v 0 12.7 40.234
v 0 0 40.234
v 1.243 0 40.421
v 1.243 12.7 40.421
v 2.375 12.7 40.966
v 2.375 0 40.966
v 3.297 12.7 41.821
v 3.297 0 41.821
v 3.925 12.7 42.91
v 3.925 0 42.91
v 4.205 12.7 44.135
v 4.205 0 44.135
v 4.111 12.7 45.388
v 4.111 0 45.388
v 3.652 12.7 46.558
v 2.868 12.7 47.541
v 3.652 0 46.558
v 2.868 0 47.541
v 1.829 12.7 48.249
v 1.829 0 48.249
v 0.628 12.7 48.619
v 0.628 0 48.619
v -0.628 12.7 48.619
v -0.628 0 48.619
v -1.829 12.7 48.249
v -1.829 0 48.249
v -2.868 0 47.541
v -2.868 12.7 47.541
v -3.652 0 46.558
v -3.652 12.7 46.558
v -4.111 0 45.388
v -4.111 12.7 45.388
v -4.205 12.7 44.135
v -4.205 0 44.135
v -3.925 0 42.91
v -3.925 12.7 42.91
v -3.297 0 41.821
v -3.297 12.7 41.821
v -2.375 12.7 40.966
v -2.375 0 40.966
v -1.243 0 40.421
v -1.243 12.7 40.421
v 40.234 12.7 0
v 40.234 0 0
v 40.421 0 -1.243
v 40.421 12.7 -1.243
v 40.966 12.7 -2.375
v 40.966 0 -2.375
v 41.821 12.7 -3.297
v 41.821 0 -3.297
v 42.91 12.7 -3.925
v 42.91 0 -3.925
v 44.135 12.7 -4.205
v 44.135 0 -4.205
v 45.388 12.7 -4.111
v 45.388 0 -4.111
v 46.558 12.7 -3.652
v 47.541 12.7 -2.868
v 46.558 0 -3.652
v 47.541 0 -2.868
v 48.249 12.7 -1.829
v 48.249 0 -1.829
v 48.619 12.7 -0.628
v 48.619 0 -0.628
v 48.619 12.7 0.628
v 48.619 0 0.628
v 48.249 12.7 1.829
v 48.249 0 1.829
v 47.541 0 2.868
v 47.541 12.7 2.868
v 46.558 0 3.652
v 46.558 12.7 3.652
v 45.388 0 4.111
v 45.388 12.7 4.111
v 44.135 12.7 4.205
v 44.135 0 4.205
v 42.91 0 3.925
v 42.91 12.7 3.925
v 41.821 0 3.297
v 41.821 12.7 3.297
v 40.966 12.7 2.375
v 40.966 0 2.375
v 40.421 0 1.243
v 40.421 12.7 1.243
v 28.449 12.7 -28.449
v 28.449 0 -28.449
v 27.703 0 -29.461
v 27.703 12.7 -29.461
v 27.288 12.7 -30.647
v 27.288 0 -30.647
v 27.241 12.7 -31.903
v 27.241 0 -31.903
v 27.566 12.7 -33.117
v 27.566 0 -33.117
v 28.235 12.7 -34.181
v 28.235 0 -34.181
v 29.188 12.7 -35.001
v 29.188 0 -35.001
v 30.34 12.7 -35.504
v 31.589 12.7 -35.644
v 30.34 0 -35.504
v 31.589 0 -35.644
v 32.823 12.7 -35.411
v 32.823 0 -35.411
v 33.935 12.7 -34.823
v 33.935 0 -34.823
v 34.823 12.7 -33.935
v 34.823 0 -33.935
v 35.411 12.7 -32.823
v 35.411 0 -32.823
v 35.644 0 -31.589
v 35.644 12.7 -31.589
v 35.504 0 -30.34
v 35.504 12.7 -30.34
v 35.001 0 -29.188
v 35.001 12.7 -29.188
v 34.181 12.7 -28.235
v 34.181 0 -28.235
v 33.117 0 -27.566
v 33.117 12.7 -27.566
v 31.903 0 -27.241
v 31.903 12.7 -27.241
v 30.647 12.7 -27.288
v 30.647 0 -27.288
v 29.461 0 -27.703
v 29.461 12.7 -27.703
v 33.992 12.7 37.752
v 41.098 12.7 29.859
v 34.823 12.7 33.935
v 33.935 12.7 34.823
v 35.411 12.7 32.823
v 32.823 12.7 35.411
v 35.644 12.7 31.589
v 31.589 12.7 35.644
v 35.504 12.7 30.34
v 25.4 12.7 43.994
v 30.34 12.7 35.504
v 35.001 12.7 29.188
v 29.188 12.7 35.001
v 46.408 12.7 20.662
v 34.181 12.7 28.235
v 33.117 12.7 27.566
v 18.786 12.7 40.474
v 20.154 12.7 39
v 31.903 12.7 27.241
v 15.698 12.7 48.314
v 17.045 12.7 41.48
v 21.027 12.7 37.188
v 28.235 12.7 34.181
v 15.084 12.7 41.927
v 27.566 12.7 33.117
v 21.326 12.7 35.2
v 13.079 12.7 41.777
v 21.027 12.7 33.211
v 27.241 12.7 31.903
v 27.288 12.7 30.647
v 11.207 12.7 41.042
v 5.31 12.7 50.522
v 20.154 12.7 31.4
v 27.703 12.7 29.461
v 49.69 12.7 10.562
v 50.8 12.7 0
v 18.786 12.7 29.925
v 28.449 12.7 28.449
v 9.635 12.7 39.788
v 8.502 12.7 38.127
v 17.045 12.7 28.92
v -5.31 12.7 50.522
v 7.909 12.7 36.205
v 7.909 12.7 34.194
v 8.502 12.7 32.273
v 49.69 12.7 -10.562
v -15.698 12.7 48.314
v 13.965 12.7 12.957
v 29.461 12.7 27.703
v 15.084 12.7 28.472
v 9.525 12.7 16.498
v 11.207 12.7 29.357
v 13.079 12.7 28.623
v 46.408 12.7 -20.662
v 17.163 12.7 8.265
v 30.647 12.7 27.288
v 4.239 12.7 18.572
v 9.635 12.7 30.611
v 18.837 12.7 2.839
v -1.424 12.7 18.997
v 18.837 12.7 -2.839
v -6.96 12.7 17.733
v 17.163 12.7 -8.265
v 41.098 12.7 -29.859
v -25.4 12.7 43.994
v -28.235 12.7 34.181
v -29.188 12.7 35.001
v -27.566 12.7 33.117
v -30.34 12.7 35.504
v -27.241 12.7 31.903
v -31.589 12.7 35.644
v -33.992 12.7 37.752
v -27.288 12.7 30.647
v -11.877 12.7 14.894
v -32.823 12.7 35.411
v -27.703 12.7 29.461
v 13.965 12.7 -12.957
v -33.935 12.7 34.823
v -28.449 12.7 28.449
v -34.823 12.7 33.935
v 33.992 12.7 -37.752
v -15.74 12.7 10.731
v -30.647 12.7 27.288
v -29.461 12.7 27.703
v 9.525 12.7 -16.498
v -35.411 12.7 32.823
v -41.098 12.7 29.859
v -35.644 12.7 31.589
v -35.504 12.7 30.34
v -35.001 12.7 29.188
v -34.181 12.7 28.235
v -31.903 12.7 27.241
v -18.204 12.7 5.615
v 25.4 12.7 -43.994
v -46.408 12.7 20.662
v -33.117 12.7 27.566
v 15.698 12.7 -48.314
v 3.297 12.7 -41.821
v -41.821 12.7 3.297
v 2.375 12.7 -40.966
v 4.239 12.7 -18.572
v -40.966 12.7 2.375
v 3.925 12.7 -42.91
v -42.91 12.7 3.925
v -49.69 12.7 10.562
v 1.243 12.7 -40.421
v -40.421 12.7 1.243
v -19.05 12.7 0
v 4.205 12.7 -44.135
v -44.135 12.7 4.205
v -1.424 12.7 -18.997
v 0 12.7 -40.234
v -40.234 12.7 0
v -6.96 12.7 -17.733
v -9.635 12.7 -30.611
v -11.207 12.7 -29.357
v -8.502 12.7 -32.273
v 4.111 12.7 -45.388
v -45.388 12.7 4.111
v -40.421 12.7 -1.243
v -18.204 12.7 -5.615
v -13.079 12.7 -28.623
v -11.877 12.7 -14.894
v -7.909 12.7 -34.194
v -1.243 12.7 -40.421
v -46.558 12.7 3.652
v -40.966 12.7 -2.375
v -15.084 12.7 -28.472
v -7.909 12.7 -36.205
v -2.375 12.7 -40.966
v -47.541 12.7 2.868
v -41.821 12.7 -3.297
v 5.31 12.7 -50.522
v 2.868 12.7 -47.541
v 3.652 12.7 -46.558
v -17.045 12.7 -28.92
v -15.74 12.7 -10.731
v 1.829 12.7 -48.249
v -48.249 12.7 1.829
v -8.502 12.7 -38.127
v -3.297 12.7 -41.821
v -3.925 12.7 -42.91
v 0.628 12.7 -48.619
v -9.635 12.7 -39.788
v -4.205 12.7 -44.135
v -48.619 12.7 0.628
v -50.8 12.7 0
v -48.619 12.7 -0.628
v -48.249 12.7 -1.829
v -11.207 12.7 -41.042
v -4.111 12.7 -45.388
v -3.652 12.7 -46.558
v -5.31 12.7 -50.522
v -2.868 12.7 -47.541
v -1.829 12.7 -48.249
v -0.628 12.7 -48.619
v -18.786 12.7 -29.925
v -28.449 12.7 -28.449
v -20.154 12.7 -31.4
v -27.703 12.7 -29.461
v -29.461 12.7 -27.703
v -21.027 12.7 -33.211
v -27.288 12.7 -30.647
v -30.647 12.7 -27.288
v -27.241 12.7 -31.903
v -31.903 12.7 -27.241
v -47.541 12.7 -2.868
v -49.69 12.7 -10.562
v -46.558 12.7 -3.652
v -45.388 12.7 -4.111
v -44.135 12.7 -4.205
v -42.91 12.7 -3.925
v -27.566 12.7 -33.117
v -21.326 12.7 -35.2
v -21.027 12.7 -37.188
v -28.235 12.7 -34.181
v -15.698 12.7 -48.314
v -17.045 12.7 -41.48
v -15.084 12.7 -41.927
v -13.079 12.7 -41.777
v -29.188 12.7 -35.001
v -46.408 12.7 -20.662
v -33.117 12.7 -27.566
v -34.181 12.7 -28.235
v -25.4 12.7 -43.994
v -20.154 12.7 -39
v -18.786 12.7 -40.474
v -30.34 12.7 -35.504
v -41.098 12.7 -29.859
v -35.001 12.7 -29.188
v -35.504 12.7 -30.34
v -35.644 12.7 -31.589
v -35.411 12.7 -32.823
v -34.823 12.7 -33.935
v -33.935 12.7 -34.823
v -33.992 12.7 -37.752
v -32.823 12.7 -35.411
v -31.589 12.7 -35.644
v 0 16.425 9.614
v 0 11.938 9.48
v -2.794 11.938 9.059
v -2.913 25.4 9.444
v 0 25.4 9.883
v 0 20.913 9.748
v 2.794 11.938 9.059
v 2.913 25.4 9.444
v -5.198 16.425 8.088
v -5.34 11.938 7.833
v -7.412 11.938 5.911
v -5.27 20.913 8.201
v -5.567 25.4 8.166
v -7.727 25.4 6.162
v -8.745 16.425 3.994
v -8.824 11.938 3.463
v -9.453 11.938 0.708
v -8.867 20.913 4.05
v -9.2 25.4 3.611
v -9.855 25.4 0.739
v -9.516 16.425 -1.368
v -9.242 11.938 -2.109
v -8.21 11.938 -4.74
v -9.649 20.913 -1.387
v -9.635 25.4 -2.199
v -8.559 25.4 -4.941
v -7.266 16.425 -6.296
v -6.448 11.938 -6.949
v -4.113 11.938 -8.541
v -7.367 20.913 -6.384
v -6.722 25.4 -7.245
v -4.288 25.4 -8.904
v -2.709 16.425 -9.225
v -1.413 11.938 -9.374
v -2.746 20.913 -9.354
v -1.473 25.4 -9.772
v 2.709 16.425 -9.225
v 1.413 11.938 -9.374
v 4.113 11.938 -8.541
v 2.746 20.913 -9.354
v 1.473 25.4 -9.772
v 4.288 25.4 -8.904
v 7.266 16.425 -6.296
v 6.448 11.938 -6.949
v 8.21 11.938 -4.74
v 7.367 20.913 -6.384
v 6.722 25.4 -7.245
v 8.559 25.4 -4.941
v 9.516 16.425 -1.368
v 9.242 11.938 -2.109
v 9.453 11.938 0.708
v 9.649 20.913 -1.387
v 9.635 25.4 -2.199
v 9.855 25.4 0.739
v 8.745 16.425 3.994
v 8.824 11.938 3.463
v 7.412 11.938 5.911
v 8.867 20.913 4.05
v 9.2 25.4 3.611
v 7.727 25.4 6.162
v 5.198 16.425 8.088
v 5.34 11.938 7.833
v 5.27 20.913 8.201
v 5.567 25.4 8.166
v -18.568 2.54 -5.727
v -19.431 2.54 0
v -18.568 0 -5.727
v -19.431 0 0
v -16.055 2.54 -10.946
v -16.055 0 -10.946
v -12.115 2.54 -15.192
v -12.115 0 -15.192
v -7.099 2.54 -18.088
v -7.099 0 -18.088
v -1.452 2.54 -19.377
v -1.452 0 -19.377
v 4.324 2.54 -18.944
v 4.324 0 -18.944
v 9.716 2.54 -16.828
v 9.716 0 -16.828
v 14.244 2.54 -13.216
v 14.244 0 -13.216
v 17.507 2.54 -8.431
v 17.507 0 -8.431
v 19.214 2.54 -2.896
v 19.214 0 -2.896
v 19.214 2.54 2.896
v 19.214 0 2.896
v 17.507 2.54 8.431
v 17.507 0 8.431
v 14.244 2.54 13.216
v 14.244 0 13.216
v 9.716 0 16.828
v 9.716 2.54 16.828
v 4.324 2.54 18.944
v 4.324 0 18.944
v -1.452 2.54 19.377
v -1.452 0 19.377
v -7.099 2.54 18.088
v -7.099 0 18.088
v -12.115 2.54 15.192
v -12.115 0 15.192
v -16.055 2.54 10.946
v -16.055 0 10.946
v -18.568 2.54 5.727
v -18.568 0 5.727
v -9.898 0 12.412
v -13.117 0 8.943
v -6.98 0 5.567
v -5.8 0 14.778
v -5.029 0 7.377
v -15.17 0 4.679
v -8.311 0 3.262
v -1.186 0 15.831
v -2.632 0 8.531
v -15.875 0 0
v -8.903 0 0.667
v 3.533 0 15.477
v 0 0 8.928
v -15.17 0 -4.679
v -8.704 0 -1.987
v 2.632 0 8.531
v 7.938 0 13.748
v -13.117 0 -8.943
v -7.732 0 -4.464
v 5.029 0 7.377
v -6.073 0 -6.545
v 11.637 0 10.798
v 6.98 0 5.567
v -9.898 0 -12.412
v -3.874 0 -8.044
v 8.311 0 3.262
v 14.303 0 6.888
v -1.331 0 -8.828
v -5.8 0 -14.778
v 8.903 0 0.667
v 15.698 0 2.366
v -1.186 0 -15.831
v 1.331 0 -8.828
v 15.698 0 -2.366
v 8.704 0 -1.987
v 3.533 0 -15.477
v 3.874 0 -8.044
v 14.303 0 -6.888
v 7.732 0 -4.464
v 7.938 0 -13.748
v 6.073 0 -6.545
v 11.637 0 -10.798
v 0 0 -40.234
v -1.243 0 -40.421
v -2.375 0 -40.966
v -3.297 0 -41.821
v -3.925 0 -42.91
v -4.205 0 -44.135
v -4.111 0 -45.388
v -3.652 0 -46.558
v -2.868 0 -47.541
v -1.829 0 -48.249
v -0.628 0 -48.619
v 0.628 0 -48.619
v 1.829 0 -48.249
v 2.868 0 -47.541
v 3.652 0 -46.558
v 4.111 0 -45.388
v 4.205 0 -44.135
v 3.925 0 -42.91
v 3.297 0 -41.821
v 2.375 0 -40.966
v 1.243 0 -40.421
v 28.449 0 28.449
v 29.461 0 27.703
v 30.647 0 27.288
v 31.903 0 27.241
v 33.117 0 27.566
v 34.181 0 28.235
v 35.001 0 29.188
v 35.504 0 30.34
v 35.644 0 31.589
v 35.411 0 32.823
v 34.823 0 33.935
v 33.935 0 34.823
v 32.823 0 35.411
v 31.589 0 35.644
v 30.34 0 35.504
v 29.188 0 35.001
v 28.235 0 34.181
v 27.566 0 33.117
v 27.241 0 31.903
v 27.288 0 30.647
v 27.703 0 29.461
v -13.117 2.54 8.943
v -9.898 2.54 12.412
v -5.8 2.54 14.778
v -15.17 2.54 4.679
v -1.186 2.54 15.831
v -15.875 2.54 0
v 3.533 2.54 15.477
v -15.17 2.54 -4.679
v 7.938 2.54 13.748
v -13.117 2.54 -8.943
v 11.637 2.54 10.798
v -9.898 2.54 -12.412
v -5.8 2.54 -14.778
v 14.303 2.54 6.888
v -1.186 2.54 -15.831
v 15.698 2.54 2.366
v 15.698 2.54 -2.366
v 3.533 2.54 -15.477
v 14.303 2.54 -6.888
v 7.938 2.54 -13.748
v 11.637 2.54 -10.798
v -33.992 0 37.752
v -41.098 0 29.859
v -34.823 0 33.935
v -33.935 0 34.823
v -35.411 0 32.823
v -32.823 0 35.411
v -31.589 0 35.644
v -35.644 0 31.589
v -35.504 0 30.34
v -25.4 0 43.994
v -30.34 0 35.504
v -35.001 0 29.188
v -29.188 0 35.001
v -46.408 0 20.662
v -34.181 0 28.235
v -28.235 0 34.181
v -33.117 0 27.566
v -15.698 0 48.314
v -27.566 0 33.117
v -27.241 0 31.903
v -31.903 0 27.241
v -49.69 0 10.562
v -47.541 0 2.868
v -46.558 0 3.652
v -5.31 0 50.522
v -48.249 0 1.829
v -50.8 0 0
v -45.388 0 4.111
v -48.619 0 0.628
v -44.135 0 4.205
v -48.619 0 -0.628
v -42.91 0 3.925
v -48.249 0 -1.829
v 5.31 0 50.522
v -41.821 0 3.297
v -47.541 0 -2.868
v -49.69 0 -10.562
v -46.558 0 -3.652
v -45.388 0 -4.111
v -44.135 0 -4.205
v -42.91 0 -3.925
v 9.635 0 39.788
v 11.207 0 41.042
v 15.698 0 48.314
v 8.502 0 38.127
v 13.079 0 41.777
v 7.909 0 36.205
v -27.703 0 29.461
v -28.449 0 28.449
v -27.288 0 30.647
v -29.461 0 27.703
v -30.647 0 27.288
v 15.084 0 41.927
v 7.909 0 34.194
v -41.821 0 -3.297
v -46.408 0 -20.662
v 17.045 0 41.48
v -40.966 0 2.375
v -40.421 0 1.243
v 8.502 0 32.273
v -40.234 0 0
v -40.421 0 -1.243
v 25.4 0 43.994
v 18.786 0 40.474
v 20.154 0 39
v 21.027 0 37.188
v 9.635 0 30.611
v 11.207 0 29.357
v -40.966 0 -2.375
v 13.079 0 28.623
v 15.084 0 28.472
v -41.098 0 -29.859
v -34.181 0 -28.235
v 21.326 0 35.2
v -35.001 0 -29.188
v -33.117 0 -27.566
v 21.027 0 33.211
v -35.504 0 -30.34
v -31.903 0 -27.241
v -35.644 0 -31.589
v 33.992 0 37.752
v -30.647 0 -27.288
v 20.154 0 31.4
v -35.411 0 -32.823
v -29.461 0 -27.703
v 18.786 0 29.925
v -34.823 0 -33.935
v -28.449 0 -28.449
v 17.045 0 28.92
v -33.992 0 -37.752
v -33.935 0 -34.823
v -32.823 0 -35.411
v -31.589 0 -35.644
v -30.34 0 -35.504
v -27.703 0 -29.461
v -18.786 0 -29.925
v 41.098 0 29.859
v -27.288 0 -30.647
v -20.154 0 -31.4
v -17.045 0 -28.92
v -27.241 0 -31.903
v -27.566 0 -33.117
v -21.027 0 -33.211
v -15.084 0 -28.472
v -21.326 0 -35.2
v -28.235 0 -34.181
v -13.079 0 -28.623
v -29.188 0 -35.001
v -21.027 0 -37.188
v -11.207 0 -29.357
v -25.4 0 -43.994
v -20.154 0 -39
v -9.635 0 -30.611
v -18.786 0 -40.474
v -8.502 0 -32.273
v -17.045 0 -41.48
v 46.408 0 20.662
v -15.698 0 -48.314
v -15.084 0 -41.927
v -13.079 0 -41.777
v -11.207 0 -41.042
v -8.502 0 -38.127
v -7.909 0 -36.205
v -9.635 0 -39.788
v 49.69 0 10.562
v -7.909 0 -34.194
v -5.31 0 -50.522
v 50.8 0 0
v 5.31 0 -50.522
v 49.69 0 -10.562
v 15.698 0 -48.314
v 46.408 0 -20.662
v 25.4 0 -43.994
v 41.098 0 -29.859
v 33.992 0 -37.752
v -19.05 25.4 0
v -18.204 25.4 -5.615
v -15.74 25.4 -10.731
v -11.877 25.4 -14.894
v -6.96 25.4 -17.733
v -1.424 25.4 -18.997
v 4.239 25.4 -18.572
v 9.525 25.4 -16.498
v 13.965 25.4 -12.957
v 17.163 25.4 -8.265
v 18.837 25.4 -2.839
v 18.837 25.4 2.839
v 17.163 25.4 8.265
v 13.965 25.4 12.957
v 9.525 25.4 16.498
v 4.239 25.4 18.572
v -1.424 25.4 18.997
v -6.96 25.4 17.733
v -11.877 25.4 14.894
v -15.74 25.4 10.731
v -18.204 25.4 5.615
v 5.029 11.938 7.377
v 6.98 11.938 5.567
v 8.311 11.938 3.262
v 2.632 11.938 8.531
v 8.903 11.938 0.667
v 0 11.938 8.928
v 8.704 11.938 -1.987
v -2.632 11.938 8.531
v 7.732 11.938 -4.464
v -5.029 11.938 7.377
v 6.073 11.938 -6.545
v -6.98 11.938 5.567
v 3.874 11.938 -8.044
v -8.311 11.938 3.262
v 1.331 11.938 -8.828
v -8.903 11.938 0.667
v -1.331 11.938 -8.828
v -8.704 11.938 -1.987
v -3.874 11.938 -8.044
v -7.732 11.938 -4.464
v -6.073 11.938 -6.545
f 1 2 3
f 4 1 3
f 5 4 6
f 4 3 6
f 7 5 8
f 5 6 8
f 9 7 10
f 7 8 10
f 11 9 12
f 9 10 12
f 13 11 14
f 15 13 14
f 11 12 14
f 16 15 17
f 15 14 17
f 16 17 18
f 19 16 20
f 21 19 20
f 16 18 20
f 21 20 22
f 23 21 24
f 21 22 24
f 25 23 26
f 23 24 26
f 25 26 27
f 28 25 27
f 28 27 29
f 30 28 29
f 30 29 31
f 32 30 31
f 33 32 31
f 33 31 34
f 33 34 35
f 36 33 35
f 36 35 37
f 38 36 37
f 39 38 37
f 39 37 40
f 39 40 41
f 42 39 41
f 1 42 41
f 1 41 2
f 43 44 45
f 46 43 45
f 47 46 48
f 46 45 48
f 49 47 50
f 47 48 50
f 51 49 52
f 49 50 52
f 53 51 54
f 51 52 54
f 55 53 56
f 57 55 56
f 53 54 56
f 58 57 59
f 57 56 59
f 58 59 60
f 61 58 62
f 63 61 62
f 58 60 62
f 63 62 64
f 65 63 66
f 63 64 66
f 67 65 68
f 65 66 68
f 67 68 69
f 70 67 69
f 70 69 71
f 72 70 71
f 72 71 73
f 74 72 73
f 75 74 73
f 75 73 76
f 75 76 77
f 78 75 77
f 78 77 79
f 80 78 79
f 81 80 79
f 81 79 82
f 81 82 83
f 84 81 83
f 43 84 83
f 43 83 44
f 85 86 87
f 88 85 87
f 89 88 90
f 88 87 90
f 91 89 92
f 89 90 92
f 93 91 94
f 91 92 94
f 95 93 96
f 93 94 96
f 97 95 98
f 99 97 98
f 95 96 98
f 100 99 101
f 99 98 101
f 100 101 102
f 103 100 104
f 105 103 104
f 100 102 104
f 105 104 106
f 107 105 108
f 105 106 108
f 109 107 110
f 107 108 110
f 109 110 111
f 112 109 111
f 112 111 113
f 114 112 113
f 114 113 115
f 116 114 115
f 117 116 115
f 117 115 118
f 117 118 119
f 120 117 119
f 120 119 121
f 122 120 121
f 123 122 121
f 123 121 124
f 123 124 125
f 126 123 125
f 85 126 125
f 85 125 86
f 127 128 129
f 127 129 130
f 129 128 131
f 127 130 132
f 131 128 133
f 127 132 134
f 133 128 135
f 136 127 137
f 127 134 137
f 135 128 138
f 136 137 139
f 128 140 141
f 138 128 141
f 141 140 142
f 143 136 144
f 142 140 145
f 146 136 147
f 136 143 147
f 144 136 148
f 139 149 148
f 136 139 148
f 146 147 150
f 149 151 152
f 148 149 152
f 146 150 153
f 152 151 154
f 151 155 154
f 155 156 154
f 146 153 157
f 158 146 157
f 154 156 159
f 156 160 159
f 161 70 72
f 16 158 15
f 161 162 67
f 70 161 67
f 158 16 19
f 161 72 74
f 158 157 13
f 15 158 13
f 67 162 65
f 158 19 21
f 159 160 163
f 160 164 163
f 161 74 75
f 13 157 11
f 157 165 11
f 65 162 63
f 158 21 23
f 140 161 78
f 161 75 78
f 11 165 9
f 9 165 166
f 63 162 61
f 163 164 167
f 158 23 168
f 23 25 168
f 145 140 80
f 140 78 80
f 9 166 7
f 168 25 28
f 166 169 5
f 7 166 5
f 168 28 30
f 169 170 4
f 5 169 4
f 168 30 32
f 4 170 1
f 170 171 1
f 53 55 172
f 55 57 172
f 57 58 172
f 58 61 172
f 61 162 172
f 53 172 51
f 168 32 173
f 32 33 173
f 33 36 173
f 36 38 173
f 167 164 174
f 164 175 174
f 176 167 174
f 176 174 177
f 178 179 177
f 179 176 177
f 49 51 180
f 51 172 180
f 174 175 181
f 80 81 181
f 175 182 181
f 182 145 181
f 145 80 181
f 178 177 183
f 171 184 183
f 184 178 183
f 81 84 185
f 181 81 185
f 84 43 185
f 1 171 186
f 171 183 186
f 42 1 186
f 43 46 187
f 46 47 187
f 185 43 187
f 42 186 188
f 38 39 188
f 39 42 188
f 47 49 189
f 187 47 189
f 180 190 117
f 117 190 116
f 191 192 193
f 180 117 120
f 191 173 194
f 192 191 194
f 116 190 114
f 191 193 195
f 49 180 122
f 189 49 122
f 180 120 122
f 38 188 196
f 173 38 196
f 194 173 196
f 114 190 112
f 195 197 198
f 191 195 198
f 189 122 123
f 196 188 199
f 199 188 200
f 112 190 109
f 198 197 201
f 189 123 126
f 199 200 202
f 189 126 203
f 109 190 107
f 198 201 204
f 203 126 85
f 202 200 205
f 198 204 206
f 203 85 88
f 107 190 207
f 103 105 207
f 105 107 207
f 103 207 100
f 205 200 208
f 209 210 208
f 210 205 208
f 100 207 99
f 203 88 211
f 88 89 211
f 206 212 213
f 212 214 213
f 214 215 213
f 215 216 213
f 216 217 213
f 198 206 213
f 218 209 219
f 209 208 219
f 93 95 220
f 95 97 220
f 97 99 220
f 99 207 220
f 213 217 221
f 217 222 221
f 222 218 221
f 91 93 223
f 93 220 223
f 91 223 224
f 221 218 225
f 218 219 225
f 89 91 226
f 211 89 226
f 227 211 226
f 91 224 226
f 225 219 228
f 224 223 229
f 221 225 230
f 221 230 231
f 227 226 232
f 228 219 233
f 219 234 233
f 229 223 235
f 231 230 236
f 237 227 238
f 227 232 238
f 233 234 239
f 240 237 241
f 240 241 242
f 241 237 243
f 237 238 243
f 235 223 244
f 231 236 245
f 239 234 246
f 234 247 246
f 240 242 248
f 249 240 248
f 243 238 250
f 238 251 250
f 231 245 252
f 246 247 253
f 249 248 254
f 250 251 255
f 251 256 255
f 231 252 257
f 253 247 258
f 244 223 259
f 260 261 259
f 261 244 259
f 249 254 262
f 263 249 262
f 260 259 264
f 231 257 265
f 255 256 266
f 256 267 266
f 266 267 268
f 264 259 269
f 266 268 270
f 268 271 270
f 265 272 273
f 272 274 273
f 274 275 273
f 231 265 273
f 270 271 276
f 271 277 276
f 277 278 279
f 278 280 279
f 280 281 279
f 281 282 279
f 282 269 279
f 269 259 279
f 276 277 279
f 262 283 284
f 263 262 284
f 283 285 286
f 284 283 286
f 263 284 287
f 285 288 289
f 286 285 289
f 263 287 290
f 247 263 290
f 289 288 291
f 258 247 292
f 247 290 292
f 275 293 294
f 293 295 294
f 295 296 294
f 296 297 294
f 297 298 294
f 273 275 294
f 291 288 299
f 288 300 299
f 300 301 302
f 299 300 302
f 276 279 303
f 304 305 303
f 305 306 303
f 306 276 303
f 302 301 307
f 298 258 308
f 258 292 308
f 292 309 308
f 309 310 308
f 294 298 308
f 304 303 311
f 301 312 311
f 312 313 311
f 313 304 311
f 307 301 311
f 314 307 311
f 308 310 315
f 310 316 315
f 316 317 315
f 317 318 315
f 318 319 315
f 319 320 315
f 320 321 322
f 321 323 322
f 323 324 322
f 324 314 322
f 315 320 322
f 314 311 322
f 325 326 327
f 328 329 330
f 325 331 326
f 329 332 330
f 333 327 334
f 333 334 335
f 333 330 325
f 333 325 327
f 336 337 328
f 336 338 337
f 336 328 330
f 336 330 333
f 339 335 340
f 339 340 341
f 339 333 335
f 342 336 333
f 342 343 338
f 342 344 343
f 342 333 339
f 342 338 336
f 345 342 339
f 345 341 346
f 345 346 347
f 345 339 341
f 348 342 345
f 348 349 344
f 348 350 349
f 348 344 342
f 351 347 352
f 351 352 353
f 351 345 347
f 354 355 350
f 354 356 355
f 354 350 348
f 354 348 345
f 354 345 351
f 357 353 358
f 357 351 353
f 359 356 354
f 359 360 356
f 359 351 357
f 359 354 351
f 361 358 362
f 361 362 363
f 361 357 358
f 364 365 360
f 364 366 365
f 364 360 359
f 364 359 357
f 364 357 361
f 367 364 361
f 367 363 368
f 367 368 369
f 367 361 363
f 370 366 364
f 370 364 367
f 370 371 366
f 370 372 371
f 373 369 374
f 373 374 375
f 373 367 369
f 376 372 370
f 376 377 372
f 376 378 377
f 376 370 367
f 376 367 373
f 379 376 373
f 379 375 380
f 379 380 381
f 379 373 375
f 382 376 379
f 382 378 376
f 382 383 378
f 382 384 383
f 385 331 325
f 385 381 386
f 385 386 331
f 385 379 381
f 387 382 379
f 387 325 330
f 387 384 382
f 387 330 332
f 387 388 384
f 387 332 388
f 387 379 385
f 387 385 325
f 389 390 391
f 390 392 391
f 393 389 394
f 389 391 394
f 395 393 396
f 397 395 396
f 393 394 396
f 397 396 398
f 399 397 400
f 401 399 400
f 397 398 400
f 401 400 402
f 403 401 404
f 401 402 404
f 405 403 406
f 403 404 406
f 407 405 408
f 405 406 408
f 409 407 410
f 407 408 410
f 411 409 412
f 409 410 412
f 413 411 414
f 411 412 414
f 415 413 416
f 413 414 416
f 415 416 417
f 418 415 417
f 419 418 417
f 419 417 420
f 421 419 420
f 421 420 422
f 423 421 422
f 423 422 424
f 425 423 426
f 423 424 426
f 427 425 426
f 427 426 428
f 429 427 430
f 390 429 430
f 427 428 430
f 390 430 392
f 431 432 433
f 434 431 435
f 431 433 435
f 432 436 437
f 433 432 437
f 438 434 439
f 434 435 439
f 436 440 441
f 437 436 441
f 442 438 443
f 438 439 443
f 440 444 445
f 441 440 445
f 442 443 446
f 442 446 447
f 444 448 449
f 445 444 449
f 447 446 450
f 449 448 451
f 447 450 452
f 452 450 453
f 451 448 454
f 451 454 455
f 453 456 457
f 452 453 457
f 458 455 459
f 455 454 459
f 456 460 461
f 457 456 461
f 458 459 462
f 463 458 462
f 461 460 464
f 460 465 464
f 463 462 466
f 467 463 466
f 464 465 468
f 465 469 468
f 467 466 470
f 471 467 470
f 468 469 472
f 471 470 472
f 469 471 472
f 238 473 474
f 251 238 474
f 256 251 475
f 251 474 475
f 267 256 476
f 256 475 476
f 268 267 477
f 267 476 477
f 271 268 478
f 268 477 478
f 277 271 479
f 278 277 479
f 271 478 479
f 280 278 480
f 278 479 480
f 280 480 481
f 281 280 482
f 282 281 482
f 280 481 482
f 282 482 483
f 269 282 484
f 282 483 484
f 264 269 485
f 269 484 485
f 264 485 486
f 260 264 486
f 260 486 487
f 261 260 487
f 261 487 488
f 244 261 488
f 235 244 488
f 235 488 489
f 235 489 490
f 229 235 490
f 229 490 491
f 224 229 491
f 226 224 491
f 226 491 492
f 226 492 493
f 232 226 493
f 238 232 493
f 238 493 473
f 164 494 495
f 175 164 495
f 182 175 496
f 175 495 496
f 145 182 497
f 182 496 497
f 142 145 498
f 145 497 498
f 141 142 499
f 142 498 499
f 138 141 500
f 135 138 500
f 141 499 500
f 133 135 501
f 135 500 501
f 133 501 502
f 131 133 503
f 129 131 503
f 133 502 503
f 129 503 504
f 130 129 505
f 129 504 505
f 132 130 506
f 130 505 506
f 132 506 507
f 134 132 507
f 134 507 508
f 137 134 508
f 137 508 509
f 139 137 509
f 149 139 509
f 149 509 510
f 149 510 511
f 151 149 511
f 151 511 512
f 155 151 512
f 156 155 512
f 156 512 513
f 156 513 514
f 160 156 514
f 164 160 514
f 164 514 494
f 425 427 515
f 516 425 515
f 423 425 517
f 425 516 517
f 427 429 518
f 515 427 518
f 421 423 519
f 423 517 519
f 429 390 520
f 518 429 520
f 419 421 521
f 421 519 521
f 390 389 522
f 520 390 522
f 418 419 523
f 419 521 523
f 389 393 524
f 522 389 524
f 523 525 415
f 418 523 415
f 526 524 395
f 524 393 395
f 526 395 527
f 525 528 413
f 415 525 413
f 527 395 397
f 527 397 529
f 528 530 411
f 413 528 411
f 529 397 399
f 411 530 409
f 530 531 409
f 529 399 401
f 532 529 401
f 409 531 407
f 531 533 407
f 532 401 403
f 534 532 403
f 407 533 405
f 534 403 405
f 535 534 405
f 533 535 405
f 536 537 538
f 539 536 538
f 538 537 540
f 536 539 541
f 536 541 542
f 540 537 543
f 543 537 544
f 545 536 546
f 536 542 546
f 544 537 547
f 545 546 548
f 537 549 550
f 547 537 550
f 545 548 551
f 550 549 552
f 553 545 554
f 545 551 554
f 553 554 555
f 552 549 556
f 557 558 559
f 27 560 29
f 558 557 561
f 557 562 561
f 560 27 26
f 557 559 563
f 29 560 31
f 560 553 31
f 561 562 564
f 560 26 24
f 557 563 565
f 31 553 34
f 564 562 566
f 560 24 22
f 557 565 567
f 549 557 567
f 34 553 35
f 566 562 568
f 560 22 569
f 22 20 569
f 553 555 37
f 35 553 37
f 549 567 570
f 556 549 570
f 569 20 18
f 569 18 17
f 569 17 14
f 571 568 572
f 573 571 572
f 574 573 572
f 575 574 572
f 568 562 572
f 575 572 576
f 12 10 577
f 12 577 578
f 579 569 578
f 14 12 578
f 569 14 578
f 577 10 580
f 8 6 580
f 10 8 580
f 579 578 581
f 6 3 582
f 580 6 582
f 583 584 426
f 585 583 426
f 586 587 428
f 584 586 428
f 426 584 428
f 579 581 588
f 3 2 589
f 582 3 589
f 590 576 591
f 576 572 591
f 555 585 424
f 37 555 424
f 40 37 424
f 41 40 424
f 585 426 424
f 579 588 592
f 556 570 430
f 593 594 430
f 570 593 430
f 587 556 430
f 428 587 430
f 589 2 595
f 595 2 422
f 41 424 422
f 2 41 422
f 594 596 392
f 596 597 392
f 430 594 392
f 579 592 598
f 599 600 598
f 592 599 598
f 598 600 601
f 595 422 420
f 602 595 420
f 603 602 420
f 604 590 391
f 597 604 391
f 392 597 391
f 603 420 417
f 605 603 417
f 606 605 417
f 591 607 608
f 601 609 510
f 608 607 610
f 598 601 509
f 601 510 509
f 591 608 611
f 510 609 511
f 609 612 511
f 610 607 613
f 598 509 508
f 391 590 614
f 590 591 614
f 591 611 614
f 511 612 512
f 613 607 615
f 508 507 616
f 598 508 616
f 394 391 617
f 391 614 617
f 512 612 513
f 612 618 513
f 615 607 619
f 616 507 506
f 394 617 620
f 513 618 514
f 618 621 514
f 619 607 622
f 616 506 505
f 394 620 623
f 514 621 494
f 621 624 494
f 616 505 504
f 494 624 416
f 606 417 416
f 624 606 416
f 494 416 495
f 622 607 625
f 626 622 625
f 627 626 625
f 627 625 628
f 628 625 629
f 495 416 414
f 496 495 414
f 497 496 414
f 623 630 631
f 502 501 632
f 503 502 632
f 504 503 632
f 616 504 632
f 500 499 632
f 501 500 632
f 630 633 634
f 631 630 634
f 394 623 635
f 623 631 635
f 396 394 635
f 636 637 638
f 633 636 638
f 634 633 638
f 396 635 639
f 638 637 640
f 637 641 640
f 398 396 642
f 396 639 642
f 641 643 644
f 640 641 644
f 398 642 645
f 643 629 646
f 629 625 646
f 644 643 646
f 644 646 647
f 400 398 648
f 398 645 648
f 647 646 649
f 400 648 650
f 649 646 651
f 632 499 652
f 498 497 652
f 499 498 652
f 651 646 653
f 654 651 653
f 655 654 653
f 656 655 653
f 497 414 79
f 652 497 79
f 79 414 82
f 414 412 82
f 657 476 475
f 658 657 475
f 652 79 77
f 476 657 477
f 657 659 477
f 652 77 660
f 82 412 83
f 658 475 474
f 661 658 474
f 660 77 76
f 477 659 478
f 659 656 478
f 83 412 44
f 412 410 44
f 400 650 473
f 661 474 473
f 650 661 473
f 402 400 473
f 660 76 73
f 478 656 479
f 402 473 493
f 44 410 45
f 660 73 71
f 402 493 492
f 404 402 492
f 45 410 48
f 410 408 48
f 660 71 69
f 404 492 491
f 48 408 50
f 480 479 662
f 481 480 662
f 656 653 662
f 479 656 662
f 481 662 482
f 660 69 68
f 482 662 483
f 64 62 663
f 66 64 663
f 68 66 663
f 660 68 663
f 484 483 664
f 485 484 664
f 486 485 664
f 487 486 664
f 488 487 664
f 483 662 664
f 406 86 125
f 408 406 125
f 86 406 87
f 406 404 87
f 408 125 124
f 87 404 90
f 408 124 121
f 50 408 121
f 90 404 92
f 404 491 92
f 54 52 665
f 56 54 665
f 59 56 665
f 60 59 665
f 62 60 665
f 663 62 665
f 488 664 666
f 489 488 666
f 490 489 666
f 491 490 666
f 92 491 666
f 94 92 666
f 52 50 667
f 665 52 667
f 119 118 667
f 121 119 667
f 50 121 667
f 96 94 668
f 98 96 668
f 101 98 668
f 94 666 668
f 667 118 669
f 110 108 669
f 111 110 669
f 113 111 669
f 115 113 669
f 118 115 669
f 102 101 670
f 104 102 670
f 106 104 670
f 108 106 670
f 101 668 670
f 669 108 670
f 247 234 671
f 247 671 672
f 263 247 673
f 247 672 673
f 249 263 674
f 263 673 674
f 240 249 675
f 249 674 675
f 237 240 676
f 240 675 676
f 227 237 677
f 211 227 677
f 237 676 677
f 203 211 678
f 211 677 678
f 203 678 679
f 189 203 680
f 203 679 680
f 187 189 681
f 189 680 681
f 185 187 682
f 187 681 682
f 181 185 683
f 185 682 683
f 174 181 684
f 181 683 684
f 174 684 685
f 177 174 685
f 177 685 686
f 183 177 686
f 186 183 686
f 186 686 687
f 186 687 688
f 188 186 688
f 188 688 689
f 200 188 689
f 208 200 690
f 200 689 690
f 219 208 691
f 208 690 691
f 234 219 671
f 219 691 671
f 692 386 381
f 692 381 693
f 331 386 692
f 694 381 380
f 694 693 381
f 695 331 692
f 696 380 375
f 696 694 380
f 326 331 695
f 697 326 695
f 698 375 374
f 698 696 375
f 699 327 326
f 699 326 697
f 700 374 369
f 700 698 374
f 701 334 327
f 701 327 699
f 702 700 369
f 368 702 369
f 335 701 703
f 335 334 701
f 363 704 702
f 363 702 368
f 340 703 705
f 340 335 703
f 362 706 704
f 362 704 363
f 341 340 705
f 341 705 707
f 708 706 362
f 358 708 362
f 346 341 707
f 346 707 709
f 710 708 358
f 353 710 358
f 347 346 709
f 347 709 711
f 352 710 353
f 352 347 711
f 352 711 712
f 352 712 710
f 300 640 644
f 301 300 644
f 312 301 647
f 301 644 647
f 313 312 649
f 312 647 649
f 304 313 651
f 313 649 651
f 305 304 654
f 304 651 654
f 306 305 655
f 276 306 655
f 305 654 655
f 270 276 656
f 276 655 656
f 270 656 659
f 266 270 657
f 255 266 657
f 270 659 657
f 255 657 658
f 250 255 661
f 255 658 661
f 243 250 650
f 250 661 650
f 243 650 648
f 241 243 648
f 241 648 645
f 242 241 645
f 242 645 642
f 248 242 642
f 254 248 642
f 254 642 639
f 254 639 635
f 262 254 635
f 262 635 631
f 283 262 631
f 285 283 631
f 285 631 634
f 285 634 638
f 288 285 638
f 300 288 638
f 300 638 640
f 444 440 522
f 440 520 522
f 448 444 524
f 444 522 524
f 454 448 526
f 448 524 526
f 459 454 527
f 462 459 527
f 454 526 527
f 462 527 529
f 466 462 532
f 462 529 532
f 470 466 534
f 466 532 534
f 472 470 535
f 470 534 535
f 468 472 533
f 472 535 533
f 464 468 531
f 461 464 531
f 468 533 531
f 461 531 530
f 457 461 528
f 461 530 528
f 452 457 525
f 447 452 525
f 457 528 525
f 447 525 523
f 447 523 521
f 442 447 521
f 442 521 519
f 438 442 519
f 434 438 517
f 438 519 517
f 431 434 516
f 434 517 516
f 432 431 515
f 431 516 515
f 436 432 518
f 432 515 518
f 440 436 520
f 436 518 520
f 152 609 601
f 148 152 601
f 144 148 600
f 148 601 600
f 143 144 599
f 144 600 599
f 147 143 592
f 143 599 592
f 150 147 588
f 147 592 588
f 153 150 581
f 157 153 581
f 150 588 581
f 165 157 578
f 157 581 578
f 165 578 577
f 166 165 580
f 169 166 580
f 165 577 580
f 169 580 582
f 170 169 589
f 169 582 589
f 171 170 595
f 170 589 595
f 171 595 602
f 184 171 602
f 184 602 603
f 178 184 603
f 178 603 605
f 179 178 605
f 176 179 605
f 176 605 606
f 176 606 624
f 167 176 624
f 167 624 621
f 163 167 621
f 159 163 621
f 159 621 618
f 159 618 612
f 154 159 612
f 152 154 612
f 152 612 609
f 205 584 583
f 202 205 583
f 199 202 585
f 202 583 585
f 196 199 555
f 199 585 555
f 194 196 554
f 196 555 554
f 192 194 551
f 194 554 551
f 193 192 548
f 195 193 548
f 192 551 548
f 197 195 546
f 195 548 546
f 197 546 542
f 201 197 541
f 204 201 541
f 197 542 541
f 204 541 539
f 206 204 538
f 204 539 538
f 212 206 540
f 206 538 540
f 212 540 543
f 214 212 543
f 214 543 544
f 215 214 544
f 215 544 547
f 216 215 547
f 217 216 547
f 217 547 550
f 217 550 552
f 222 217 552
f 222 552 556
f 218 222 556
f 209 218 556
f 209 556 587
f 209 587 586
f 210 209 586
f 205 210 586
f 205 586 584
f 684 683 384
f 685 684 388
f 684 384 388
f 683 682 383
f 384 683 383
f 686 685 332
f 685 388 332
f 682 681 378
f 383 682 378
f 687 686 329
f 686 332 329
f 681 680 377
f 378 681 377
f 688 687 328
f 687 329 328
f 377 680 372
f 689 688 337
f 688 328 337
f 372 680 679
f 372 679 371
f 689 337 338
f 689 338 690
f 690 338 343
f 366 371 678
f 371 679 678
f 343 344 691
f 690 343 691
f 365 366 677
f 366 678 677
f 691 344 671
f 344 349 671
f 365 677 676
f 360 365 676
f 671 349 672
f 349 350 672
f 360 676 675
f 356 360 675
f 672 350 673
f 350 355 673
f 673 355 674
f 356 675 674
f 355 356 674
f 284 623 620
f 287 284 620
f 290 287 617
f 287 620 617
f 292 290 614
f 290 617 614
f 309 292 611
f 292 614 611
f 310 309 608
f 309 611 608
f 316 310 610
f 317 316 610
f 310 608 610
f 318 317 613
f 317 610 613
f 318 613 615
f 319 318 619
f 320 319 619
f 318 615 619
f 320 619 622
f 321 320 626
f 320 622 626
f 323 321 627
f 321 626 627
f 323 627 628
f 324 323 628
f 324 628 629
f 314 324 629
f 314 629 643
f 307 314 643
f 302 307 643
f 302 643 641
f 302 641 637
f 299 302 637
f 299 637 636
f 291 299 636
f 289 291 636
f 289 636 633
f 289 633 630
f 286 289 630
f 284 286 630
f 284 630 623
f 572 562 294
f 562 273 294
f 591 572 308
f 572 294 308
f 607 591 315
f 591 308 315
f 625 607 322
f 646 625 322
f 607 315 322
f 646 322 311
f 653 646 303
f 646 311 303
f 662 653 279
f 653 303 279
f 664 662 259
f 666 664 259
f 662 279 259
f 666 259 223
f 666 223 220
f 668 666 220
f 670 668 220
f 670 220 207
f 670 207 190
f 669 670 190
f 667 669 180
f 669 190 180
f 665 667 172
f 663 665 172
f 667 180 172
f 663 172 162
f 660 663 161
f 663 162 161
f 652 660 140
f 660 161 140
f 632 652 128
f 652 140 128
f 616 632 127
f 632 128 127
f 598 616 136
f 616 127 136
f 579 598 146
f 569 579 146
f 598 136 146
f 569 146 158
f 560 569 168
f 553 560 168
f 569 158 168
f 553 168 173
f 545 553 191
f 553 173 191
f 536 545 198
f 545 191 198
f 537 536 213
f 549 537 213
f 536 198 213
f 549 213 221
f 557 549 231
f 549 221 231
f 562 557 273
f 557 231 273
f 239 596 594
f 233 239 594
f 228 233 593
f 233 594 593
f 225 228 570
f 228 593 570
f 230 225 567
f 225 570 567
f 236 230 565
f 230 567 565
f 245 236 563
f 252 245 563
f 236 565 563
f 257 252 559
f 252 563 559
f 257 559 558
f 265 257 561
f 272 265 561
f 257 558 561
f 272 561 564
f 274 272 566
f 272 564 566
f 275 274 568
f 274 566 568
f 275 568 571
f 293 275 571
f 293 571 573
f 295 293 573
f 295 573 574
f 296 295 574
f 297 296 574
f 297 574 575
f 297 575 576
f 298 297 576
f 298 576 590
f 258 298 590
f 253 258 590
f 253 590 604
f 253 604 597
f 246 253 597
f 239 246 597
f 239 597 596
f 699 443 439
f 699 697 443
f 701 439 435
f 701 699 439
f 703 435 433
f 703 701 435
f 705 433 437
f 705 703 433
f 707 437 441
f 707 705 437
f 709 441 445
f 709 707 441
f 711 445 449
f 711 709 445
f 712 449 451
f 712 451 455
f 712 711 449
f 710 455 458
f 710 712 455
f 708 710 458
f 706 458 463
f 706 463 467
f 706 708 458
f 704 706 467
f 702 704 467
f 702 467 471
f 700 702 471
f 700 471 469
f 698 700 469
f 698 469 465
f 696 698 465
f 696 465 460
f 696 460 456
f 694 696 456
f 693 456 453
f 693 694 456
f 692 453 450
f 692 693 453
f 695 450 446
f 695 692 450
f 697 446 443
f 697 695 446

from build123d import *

# Parameters (mm, degrees)
F_5_16_CLEARANCE_HOLE1_D = 8.4328
CIRPATTERN1_COUNT        = 8
F_1_2_CLEARANCE_HOLE1_D  = 13.49248
CIRPATTERN2_COUNT        = 2


with BuildPart() as part:
    # Sketch1 → Revolve1 (revolve)
    with BuildSketch(Plane.XY):
        Polygon((-19.431, 0), (-50.8, 0), (-50.8, 12.7), (-19.05, 12.7), (-19.05, 25.4), (0, 25.4), (0, 0), (-15.875, 0), (-15.875, 2.54), (-19.431, 2.54), align=None)
    revolve(axis=Axis((0, 25.4, 0), (0, -1, 0)))

    # Sketch4 → 1/2 NPT Tapped Hole1 (revolve, cut)
    with BuildSketch(Plane(origin=(0, 25.4, 0), x_dir=(0, 0, 1), z_dir=(1, 0, 0))):
        Polygon((0, 0), (0, 25.4), (8.9281, 25.4), (8.9281, 13.462), (9.479726792, 13.462), (9.8827971, 0), align=None)
    revolve(axis=Axis((0, 31.75, 0), (0, -1, 0)), mode=Mode.SUBTRACT)

    # 5/16 Clearance Hole1 (through all)
    with Locations(Plane(origin=(0, 12.7, 0), x_dir=(1, 0, 0), z_dir=(0, 1, 0))):
        with Locations((44.45, 0)):
            f_5_16_clearance_hole1 = Hole(F_5_16_CLEARANCE_HOLE1_D / 2)

    # CirPattern1: 5/16 Clearance Hole1 ×8 about axis
    cirpattern1_axis = Axis((0, 0, 0), (0, 1, 0))
    for i in range(1, CIRPATTERN1_COUNT):
        add(f_5_16_clearance_hole1.rotate(cirpattern1_axis, i * 360 / CIRPATTERN1_COUNT), mode=Mode.SUBTRACT)

    # 1/2 Clearance Hole1 (through all)
    with Locations(Plane(origin=(0, 12.7, 0), x_dir=(1, 0, 0), z_dir=(0, 1, 0))):
        with Locations((-14.580238773, 35.199810189)):
            f_1_2_clearance_hole1 = Hole(F_1_2_CLEARANCE_HOLE1_D / 2)

    # CirPattern2: 1/2 Clearance Hole1 ×2 about axis
    cirpattern2_axis = Axis((0, 0, 0), (0, 1, 0))
    for i in range(1, CIRPATTERN2_COUNT):
        add(f_1_2_clearance_hole1.rotate(cirpattern2_axis, i * 360 / CIRPATTERN2_COUNT), mode=Mode.SUBTRACT)


solid = part.part
